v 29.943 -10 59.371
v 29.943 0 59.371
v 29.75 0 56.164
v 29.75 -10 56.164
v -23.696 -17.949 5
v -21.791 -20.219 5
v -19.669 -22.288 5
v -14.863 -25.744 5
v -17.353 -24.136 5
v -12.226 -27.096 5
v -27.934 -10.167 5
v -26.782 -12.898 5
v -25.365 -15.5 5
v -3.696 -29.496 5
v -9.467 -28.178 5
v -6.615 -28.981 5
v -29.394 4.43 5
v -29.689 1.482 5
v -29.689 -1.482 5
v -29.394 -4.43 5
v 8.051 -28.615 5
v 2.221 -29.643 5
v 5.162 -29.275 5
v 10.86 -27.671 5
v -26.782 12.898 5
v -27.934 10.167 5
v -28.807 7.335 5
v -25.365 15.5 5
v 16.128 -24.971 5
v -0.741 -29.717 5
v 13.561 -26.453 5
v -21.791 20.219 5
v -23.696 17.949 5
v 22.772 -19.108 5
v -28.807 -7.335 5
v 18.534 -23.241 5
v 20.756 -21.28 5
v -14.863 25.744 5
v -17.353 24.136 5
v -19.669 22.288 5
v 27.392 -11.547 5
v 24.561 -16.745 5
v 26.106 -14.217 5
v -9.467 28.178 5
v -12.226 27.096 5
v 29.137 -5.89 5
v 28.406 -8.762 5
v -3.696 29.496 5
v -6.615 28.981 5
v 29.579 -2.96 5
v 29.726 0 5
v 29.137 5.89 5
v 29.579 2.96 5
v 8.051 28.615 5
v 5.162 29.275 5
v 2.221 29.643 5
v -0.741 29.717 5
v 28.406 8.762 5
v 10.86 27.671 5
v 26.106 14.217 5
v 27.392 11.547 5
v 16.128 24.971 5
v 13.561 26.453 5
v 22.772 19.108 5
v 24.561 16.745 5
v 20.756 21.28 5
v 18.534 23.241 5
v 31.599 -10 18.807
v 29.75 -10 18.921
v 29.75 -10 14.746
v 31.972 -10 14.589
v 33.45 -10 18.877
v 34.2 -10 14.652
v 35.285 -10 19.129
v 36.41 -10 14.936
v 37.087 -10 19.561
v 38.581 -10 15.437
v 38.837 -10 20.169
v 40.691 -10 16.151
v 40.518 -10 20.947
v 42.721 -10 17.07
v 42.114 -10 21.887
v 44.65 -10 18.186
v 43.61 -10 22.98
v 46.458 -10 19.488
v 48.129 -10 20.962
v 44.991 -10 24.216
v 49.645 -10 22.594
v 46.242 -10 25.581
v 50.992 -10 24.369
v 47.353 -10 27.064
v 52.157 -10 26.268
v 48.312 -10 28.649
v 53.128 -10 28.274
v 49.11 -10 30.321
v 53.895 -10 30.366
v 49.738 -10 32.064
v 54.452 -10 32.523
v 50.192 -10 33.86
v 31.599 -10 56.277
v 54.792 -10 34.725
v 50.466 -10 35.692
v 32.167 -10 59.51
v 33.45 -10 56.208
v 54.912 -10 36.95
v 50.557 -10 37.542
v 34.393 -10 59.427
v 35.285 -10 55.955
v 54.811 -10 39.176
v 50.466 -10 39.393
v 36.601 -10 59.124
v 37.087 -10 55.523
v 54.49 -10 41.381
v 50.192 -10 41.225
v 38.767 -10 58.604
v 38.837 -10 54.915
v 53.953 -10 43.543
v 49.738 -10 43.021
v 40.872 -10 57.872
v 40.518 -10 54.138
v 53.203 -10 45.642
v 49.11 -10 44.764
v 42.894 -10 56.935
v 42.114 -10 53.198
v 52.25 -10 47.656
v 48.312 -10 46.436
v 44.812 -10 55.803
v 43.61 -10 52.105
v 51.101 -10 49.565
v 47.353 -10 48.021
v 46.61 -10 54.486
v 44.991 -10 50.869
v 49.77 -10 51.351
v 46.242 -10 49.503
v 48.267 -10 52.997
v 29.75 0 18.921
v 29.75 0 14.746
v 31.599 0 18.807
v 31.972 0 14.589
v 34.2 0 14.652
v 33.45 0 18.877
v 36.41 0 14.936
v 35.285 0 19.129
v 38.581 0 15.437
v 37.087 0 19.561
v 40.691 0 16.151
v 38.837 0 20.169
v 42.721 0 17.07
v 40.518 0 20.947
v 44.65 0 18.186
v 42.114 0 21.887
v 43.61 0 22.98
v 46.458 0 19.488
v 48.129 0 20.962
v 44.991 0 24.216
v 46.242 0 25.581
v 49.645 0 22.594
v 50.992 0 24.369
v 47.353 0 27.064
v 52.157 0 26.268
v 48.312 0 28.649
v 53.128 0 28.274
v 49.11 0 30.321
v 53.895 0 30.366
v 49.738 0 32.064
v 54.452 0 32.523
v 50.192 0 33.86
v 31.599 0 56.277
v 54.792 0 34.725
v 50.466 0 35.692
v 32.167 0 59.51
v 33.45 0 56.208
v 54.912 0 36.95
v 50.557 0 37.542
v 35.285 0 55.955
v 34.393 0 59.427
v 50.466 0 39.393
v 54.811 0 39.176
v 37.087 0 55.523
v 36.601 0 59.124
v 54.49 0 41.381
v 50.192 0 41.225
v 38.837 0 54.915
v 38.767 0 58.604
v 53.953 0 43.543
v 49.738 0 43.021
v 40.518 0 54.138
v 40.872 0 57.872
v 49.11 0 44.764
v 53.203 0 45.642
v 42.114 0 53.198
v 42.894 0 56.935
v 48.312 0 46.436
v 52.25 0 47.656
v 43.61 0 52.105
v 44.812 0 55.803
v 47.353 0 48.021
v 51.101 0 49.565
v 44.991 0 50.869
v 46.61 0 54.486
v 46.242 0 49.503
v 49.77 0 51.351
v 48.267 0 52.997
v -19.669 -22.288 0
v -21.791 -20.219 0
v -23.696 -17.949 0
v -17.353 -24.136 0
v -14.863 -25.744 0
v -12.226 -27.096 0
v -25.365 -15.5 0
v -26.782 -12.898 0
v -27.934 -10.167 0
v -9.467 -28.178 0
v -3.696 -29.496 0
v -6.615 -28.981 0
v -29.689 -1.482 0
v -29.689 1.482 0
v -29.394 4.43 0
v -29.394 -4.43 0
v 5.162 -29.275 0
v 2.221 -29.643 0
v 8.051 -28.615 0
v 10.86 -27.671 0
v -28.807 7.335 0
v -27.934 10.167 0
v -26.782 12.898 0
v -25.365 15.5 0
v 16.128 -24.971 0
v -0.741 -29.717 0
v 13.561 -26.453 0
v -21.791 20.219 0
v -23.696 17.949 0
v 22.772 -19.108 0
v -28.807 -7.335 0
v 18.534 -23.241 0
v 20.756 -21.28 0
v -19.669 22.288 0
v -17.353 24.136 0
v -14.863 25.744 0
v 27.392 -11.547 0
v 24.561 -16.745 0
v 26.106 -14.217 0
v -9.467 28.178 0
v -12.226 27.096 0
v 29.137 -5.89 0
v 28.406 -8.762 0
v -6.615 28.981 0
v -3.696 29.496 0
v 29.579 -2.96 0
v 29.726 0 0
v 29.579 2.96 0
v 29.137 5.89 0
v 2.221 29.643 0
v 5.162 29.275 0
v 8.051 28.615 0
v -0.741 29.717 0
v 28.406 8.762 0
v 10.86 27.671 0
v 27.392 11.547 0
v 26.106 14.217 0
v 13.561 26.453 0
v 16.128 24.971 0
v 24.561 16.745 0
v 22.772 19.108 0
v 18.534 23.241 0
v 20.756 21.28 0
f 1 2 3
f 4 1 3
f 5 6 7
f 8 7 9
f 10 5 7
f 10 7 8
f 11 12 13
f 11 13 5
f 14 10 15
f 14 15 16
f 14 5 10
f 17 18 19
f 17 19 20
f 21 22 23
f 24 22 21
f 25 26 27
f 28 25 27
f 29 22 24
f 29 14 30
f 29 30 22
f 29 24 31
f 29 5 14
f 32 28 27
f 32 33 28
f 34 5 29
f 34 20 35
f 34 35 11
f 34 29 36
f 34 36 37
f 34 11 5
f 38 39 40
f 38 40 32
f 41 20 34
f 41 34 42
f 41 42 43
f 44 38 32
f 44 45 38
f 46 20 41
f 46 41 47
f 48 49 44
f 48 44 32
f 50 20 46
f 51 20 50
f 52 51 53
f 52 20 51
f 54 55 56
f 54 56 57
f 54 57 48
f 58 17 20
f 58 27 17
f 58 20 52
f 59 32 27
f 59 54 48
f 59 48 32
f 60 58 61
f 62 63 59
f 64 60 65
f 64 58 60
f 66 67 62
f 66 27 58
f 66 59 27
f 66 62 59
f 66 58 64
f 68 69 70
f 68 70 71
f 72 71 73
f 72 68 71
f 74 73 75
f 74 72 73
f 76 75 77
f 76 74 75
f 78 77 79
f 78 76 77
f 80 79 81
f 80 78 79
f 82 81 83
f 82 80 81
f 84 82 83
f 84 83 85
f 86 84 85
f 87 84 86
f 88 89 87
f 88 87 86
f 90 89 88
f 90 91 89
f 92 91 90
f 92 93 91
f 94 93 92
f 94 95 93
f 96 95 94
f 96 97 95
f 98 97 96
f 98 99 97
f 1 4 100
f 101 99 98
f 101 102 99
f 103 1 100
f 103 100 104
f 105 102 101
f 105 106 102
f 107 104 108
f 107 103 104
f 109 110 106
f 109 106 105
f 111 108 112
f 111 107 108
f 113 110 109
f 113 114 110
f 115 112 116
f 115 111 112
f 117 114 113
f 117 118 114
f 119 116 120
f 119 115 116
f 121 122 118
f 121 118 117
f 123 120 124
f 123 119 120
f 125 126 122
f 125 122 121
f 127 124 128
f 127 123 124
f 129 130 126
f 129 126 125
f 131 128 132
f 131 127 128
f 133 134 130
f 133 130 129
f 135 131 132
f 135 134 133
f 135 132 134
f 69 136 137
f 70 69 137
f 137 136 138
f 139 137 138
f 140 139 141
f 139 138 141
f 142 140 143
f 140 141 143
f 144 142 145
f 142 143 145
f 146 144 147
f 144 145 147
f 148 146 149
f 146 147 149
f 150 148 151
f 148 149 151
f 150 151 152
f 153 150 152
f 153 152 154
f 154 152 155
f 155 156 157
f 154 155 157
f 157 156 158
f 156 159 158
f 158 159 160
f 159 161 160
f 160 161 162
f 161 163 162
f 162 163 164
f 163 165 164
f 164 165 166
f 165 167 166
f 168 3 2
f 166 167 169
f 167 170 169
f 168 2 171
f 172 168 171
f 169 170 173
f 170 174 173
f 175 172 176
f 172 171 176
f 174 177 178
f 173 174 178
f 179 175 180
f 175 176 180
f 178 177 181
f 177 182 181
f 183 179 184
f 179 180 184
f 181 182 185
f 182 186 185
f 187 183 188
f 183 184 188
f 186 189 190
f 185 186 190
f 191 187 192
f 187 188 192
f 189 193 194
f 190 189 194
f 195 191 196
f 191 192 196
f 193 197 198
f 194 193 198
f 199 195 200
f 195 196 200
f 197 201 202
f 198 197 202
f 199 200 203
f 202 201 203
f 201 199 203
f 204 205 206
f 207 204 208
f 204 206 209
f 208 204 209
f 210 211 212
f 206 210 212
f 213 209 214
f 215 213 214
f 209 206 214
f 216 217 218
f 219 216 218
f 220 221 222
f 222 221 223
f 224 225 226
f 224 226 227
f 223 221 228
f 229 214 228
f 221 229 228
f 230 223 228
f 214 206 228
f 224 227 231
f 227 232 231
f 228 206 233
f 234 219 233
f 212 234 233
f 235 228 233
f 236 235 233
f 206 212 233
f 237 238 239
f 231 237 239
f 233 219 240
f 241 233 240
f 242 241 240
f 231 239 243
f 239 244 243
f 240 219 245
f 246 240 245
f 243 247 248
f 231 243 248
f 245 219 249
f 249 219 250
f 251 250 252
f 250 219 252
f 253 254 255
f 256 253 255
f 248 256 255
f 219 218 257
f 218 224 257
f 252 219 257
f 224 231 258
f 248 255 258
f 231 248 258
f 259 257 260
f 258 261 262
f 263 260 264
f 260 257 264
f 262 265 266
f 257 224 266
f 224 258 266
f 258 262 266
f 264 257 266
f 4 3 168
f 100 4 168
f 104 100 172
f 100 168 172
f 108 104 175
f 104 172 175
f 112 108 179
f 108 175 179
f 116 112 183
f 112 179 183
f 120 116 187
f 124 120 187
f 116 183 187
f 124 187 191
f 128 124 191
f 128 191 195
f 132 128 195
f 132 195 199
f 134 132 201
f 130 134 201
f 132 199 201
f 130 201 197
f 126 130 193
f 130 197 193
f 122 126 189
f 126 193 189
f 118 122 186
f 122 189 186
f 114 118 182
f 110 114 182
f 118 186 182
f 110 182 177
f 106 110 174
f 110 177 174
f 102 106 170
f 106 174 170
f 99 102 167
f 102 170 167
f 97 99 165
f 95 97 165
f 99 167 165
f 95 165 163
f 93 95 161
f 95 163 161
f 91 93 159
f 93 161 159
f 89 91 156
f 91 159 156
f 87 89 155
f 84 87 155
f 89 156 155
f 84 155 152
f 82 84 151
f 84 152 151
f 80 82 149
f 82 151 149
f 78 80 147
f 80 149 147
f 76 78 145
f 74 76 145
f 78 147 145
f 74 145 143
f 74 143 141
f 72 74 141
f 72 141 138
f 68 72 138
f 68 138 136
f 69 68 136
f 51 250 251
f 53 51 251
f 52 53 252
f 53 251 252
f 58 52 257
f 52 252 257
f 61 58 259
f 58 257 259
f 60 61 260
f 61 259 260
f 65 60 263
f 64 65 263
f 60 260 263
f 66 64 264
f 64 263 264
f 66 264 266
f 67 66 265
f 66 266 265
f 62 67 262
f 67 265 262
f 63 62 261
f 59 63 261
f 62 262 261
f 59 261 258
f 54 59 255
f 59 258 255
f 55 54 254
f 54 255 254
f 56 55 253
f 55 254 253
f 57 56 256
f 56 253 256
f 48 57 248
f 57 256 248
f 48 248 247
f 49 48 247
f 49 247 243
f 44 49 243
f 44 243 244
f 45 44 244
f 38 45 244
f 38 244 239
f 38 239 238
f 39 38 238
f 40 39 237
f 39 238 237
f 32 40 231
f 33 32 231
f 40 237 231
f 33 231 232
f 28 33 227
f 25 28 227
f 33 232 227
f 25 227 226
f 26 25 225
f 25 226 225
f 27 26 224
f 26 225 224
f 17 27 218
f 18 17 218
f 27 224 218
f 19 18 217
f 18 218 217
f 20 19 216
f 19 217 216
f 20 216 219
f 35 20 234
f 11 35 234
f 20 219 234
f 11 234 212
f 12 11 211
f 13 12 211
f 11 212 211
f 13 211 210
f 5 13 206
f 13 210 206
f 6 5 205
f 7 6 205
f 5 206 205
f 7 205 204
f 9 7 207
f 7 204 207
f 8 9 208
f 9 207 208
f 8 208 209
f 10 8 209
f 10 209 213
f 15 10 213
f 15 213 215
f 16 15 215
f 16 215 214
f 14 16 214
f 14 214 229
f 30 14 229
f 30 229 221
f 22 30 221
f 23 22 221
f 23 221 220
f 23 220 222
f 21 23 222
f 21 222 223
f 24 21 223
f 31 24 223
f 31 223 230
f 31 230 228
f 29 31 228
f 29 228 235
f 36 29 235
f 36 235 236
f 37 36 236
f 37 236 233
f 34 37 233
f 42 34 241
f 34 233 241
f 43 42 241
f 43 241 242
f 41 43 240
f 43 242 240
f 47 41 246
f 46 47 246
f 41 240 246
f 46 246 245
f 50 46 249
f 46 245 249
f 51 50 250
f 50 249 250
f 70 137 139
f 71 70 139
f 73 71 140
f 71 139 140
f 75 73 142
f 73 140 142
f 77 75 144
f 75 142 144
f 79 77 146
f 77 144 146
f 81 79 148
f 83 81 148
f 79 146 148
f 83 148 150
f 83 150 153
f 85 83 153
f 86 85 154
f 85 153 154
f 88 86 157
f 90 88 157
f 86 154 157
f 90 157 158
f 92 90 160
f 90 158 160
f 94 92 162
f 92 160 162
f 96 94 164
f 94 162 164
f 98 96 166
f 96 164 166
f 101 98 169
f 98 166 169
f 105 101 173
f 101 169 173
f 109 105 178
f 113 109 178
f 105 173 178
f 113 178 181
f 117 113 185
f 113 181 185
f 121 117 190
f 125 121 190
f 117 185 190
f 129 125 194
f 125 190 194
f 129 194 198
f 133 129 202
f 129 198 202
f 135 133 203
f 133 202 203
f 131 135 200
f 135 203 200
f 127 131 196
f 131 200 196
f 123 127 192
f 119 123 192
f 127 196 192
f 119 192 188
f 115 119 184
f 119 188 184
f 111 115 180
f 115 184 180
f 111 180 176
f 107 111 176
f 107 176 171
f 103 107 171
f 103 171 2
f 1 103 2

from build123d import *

# Parameters (mm, degrees)
F3_DEPTH = 10
F4_R     = 29.7263240479
F5_DEPTH = 5


# Not quite as in the source:
# - the program builds the solid bodies; features that only make, move or delete a surface that nothing else refers to are left out


with BuildPart() as f3:
    # F2 (on Front) → F3 (new body)
    with BuildSketch(Plane.XZ):
        with BuildLine():
            Line((29.749751091, 18.9209990203), (29.749751091, 14.7464834154))
            ThreePointArc((29.749751091, 14.7464834154), (54.9120135043, 36.9502850693), (29.9429353327, 59.3711100519))
            Line((29.9429353327, 59.3711100519), (29.749751091, 56.1637170613))
            ThreePointArc((29.749751091, 56.1637170613), (50.5571184209, 37.5423580408), (29.749751091, 18.9209990203))
        make_face()
    extrude(amount=F3_DEPTH)


with BuildPart() as f5:
    # F4 (on Top) → F5 (new body)
    with BuildSketch(Plane.XY):
        Circle(F4_R)
    extrude(amount=F5_DEPTH)


solid = Compound([f3.part, f5.part])
